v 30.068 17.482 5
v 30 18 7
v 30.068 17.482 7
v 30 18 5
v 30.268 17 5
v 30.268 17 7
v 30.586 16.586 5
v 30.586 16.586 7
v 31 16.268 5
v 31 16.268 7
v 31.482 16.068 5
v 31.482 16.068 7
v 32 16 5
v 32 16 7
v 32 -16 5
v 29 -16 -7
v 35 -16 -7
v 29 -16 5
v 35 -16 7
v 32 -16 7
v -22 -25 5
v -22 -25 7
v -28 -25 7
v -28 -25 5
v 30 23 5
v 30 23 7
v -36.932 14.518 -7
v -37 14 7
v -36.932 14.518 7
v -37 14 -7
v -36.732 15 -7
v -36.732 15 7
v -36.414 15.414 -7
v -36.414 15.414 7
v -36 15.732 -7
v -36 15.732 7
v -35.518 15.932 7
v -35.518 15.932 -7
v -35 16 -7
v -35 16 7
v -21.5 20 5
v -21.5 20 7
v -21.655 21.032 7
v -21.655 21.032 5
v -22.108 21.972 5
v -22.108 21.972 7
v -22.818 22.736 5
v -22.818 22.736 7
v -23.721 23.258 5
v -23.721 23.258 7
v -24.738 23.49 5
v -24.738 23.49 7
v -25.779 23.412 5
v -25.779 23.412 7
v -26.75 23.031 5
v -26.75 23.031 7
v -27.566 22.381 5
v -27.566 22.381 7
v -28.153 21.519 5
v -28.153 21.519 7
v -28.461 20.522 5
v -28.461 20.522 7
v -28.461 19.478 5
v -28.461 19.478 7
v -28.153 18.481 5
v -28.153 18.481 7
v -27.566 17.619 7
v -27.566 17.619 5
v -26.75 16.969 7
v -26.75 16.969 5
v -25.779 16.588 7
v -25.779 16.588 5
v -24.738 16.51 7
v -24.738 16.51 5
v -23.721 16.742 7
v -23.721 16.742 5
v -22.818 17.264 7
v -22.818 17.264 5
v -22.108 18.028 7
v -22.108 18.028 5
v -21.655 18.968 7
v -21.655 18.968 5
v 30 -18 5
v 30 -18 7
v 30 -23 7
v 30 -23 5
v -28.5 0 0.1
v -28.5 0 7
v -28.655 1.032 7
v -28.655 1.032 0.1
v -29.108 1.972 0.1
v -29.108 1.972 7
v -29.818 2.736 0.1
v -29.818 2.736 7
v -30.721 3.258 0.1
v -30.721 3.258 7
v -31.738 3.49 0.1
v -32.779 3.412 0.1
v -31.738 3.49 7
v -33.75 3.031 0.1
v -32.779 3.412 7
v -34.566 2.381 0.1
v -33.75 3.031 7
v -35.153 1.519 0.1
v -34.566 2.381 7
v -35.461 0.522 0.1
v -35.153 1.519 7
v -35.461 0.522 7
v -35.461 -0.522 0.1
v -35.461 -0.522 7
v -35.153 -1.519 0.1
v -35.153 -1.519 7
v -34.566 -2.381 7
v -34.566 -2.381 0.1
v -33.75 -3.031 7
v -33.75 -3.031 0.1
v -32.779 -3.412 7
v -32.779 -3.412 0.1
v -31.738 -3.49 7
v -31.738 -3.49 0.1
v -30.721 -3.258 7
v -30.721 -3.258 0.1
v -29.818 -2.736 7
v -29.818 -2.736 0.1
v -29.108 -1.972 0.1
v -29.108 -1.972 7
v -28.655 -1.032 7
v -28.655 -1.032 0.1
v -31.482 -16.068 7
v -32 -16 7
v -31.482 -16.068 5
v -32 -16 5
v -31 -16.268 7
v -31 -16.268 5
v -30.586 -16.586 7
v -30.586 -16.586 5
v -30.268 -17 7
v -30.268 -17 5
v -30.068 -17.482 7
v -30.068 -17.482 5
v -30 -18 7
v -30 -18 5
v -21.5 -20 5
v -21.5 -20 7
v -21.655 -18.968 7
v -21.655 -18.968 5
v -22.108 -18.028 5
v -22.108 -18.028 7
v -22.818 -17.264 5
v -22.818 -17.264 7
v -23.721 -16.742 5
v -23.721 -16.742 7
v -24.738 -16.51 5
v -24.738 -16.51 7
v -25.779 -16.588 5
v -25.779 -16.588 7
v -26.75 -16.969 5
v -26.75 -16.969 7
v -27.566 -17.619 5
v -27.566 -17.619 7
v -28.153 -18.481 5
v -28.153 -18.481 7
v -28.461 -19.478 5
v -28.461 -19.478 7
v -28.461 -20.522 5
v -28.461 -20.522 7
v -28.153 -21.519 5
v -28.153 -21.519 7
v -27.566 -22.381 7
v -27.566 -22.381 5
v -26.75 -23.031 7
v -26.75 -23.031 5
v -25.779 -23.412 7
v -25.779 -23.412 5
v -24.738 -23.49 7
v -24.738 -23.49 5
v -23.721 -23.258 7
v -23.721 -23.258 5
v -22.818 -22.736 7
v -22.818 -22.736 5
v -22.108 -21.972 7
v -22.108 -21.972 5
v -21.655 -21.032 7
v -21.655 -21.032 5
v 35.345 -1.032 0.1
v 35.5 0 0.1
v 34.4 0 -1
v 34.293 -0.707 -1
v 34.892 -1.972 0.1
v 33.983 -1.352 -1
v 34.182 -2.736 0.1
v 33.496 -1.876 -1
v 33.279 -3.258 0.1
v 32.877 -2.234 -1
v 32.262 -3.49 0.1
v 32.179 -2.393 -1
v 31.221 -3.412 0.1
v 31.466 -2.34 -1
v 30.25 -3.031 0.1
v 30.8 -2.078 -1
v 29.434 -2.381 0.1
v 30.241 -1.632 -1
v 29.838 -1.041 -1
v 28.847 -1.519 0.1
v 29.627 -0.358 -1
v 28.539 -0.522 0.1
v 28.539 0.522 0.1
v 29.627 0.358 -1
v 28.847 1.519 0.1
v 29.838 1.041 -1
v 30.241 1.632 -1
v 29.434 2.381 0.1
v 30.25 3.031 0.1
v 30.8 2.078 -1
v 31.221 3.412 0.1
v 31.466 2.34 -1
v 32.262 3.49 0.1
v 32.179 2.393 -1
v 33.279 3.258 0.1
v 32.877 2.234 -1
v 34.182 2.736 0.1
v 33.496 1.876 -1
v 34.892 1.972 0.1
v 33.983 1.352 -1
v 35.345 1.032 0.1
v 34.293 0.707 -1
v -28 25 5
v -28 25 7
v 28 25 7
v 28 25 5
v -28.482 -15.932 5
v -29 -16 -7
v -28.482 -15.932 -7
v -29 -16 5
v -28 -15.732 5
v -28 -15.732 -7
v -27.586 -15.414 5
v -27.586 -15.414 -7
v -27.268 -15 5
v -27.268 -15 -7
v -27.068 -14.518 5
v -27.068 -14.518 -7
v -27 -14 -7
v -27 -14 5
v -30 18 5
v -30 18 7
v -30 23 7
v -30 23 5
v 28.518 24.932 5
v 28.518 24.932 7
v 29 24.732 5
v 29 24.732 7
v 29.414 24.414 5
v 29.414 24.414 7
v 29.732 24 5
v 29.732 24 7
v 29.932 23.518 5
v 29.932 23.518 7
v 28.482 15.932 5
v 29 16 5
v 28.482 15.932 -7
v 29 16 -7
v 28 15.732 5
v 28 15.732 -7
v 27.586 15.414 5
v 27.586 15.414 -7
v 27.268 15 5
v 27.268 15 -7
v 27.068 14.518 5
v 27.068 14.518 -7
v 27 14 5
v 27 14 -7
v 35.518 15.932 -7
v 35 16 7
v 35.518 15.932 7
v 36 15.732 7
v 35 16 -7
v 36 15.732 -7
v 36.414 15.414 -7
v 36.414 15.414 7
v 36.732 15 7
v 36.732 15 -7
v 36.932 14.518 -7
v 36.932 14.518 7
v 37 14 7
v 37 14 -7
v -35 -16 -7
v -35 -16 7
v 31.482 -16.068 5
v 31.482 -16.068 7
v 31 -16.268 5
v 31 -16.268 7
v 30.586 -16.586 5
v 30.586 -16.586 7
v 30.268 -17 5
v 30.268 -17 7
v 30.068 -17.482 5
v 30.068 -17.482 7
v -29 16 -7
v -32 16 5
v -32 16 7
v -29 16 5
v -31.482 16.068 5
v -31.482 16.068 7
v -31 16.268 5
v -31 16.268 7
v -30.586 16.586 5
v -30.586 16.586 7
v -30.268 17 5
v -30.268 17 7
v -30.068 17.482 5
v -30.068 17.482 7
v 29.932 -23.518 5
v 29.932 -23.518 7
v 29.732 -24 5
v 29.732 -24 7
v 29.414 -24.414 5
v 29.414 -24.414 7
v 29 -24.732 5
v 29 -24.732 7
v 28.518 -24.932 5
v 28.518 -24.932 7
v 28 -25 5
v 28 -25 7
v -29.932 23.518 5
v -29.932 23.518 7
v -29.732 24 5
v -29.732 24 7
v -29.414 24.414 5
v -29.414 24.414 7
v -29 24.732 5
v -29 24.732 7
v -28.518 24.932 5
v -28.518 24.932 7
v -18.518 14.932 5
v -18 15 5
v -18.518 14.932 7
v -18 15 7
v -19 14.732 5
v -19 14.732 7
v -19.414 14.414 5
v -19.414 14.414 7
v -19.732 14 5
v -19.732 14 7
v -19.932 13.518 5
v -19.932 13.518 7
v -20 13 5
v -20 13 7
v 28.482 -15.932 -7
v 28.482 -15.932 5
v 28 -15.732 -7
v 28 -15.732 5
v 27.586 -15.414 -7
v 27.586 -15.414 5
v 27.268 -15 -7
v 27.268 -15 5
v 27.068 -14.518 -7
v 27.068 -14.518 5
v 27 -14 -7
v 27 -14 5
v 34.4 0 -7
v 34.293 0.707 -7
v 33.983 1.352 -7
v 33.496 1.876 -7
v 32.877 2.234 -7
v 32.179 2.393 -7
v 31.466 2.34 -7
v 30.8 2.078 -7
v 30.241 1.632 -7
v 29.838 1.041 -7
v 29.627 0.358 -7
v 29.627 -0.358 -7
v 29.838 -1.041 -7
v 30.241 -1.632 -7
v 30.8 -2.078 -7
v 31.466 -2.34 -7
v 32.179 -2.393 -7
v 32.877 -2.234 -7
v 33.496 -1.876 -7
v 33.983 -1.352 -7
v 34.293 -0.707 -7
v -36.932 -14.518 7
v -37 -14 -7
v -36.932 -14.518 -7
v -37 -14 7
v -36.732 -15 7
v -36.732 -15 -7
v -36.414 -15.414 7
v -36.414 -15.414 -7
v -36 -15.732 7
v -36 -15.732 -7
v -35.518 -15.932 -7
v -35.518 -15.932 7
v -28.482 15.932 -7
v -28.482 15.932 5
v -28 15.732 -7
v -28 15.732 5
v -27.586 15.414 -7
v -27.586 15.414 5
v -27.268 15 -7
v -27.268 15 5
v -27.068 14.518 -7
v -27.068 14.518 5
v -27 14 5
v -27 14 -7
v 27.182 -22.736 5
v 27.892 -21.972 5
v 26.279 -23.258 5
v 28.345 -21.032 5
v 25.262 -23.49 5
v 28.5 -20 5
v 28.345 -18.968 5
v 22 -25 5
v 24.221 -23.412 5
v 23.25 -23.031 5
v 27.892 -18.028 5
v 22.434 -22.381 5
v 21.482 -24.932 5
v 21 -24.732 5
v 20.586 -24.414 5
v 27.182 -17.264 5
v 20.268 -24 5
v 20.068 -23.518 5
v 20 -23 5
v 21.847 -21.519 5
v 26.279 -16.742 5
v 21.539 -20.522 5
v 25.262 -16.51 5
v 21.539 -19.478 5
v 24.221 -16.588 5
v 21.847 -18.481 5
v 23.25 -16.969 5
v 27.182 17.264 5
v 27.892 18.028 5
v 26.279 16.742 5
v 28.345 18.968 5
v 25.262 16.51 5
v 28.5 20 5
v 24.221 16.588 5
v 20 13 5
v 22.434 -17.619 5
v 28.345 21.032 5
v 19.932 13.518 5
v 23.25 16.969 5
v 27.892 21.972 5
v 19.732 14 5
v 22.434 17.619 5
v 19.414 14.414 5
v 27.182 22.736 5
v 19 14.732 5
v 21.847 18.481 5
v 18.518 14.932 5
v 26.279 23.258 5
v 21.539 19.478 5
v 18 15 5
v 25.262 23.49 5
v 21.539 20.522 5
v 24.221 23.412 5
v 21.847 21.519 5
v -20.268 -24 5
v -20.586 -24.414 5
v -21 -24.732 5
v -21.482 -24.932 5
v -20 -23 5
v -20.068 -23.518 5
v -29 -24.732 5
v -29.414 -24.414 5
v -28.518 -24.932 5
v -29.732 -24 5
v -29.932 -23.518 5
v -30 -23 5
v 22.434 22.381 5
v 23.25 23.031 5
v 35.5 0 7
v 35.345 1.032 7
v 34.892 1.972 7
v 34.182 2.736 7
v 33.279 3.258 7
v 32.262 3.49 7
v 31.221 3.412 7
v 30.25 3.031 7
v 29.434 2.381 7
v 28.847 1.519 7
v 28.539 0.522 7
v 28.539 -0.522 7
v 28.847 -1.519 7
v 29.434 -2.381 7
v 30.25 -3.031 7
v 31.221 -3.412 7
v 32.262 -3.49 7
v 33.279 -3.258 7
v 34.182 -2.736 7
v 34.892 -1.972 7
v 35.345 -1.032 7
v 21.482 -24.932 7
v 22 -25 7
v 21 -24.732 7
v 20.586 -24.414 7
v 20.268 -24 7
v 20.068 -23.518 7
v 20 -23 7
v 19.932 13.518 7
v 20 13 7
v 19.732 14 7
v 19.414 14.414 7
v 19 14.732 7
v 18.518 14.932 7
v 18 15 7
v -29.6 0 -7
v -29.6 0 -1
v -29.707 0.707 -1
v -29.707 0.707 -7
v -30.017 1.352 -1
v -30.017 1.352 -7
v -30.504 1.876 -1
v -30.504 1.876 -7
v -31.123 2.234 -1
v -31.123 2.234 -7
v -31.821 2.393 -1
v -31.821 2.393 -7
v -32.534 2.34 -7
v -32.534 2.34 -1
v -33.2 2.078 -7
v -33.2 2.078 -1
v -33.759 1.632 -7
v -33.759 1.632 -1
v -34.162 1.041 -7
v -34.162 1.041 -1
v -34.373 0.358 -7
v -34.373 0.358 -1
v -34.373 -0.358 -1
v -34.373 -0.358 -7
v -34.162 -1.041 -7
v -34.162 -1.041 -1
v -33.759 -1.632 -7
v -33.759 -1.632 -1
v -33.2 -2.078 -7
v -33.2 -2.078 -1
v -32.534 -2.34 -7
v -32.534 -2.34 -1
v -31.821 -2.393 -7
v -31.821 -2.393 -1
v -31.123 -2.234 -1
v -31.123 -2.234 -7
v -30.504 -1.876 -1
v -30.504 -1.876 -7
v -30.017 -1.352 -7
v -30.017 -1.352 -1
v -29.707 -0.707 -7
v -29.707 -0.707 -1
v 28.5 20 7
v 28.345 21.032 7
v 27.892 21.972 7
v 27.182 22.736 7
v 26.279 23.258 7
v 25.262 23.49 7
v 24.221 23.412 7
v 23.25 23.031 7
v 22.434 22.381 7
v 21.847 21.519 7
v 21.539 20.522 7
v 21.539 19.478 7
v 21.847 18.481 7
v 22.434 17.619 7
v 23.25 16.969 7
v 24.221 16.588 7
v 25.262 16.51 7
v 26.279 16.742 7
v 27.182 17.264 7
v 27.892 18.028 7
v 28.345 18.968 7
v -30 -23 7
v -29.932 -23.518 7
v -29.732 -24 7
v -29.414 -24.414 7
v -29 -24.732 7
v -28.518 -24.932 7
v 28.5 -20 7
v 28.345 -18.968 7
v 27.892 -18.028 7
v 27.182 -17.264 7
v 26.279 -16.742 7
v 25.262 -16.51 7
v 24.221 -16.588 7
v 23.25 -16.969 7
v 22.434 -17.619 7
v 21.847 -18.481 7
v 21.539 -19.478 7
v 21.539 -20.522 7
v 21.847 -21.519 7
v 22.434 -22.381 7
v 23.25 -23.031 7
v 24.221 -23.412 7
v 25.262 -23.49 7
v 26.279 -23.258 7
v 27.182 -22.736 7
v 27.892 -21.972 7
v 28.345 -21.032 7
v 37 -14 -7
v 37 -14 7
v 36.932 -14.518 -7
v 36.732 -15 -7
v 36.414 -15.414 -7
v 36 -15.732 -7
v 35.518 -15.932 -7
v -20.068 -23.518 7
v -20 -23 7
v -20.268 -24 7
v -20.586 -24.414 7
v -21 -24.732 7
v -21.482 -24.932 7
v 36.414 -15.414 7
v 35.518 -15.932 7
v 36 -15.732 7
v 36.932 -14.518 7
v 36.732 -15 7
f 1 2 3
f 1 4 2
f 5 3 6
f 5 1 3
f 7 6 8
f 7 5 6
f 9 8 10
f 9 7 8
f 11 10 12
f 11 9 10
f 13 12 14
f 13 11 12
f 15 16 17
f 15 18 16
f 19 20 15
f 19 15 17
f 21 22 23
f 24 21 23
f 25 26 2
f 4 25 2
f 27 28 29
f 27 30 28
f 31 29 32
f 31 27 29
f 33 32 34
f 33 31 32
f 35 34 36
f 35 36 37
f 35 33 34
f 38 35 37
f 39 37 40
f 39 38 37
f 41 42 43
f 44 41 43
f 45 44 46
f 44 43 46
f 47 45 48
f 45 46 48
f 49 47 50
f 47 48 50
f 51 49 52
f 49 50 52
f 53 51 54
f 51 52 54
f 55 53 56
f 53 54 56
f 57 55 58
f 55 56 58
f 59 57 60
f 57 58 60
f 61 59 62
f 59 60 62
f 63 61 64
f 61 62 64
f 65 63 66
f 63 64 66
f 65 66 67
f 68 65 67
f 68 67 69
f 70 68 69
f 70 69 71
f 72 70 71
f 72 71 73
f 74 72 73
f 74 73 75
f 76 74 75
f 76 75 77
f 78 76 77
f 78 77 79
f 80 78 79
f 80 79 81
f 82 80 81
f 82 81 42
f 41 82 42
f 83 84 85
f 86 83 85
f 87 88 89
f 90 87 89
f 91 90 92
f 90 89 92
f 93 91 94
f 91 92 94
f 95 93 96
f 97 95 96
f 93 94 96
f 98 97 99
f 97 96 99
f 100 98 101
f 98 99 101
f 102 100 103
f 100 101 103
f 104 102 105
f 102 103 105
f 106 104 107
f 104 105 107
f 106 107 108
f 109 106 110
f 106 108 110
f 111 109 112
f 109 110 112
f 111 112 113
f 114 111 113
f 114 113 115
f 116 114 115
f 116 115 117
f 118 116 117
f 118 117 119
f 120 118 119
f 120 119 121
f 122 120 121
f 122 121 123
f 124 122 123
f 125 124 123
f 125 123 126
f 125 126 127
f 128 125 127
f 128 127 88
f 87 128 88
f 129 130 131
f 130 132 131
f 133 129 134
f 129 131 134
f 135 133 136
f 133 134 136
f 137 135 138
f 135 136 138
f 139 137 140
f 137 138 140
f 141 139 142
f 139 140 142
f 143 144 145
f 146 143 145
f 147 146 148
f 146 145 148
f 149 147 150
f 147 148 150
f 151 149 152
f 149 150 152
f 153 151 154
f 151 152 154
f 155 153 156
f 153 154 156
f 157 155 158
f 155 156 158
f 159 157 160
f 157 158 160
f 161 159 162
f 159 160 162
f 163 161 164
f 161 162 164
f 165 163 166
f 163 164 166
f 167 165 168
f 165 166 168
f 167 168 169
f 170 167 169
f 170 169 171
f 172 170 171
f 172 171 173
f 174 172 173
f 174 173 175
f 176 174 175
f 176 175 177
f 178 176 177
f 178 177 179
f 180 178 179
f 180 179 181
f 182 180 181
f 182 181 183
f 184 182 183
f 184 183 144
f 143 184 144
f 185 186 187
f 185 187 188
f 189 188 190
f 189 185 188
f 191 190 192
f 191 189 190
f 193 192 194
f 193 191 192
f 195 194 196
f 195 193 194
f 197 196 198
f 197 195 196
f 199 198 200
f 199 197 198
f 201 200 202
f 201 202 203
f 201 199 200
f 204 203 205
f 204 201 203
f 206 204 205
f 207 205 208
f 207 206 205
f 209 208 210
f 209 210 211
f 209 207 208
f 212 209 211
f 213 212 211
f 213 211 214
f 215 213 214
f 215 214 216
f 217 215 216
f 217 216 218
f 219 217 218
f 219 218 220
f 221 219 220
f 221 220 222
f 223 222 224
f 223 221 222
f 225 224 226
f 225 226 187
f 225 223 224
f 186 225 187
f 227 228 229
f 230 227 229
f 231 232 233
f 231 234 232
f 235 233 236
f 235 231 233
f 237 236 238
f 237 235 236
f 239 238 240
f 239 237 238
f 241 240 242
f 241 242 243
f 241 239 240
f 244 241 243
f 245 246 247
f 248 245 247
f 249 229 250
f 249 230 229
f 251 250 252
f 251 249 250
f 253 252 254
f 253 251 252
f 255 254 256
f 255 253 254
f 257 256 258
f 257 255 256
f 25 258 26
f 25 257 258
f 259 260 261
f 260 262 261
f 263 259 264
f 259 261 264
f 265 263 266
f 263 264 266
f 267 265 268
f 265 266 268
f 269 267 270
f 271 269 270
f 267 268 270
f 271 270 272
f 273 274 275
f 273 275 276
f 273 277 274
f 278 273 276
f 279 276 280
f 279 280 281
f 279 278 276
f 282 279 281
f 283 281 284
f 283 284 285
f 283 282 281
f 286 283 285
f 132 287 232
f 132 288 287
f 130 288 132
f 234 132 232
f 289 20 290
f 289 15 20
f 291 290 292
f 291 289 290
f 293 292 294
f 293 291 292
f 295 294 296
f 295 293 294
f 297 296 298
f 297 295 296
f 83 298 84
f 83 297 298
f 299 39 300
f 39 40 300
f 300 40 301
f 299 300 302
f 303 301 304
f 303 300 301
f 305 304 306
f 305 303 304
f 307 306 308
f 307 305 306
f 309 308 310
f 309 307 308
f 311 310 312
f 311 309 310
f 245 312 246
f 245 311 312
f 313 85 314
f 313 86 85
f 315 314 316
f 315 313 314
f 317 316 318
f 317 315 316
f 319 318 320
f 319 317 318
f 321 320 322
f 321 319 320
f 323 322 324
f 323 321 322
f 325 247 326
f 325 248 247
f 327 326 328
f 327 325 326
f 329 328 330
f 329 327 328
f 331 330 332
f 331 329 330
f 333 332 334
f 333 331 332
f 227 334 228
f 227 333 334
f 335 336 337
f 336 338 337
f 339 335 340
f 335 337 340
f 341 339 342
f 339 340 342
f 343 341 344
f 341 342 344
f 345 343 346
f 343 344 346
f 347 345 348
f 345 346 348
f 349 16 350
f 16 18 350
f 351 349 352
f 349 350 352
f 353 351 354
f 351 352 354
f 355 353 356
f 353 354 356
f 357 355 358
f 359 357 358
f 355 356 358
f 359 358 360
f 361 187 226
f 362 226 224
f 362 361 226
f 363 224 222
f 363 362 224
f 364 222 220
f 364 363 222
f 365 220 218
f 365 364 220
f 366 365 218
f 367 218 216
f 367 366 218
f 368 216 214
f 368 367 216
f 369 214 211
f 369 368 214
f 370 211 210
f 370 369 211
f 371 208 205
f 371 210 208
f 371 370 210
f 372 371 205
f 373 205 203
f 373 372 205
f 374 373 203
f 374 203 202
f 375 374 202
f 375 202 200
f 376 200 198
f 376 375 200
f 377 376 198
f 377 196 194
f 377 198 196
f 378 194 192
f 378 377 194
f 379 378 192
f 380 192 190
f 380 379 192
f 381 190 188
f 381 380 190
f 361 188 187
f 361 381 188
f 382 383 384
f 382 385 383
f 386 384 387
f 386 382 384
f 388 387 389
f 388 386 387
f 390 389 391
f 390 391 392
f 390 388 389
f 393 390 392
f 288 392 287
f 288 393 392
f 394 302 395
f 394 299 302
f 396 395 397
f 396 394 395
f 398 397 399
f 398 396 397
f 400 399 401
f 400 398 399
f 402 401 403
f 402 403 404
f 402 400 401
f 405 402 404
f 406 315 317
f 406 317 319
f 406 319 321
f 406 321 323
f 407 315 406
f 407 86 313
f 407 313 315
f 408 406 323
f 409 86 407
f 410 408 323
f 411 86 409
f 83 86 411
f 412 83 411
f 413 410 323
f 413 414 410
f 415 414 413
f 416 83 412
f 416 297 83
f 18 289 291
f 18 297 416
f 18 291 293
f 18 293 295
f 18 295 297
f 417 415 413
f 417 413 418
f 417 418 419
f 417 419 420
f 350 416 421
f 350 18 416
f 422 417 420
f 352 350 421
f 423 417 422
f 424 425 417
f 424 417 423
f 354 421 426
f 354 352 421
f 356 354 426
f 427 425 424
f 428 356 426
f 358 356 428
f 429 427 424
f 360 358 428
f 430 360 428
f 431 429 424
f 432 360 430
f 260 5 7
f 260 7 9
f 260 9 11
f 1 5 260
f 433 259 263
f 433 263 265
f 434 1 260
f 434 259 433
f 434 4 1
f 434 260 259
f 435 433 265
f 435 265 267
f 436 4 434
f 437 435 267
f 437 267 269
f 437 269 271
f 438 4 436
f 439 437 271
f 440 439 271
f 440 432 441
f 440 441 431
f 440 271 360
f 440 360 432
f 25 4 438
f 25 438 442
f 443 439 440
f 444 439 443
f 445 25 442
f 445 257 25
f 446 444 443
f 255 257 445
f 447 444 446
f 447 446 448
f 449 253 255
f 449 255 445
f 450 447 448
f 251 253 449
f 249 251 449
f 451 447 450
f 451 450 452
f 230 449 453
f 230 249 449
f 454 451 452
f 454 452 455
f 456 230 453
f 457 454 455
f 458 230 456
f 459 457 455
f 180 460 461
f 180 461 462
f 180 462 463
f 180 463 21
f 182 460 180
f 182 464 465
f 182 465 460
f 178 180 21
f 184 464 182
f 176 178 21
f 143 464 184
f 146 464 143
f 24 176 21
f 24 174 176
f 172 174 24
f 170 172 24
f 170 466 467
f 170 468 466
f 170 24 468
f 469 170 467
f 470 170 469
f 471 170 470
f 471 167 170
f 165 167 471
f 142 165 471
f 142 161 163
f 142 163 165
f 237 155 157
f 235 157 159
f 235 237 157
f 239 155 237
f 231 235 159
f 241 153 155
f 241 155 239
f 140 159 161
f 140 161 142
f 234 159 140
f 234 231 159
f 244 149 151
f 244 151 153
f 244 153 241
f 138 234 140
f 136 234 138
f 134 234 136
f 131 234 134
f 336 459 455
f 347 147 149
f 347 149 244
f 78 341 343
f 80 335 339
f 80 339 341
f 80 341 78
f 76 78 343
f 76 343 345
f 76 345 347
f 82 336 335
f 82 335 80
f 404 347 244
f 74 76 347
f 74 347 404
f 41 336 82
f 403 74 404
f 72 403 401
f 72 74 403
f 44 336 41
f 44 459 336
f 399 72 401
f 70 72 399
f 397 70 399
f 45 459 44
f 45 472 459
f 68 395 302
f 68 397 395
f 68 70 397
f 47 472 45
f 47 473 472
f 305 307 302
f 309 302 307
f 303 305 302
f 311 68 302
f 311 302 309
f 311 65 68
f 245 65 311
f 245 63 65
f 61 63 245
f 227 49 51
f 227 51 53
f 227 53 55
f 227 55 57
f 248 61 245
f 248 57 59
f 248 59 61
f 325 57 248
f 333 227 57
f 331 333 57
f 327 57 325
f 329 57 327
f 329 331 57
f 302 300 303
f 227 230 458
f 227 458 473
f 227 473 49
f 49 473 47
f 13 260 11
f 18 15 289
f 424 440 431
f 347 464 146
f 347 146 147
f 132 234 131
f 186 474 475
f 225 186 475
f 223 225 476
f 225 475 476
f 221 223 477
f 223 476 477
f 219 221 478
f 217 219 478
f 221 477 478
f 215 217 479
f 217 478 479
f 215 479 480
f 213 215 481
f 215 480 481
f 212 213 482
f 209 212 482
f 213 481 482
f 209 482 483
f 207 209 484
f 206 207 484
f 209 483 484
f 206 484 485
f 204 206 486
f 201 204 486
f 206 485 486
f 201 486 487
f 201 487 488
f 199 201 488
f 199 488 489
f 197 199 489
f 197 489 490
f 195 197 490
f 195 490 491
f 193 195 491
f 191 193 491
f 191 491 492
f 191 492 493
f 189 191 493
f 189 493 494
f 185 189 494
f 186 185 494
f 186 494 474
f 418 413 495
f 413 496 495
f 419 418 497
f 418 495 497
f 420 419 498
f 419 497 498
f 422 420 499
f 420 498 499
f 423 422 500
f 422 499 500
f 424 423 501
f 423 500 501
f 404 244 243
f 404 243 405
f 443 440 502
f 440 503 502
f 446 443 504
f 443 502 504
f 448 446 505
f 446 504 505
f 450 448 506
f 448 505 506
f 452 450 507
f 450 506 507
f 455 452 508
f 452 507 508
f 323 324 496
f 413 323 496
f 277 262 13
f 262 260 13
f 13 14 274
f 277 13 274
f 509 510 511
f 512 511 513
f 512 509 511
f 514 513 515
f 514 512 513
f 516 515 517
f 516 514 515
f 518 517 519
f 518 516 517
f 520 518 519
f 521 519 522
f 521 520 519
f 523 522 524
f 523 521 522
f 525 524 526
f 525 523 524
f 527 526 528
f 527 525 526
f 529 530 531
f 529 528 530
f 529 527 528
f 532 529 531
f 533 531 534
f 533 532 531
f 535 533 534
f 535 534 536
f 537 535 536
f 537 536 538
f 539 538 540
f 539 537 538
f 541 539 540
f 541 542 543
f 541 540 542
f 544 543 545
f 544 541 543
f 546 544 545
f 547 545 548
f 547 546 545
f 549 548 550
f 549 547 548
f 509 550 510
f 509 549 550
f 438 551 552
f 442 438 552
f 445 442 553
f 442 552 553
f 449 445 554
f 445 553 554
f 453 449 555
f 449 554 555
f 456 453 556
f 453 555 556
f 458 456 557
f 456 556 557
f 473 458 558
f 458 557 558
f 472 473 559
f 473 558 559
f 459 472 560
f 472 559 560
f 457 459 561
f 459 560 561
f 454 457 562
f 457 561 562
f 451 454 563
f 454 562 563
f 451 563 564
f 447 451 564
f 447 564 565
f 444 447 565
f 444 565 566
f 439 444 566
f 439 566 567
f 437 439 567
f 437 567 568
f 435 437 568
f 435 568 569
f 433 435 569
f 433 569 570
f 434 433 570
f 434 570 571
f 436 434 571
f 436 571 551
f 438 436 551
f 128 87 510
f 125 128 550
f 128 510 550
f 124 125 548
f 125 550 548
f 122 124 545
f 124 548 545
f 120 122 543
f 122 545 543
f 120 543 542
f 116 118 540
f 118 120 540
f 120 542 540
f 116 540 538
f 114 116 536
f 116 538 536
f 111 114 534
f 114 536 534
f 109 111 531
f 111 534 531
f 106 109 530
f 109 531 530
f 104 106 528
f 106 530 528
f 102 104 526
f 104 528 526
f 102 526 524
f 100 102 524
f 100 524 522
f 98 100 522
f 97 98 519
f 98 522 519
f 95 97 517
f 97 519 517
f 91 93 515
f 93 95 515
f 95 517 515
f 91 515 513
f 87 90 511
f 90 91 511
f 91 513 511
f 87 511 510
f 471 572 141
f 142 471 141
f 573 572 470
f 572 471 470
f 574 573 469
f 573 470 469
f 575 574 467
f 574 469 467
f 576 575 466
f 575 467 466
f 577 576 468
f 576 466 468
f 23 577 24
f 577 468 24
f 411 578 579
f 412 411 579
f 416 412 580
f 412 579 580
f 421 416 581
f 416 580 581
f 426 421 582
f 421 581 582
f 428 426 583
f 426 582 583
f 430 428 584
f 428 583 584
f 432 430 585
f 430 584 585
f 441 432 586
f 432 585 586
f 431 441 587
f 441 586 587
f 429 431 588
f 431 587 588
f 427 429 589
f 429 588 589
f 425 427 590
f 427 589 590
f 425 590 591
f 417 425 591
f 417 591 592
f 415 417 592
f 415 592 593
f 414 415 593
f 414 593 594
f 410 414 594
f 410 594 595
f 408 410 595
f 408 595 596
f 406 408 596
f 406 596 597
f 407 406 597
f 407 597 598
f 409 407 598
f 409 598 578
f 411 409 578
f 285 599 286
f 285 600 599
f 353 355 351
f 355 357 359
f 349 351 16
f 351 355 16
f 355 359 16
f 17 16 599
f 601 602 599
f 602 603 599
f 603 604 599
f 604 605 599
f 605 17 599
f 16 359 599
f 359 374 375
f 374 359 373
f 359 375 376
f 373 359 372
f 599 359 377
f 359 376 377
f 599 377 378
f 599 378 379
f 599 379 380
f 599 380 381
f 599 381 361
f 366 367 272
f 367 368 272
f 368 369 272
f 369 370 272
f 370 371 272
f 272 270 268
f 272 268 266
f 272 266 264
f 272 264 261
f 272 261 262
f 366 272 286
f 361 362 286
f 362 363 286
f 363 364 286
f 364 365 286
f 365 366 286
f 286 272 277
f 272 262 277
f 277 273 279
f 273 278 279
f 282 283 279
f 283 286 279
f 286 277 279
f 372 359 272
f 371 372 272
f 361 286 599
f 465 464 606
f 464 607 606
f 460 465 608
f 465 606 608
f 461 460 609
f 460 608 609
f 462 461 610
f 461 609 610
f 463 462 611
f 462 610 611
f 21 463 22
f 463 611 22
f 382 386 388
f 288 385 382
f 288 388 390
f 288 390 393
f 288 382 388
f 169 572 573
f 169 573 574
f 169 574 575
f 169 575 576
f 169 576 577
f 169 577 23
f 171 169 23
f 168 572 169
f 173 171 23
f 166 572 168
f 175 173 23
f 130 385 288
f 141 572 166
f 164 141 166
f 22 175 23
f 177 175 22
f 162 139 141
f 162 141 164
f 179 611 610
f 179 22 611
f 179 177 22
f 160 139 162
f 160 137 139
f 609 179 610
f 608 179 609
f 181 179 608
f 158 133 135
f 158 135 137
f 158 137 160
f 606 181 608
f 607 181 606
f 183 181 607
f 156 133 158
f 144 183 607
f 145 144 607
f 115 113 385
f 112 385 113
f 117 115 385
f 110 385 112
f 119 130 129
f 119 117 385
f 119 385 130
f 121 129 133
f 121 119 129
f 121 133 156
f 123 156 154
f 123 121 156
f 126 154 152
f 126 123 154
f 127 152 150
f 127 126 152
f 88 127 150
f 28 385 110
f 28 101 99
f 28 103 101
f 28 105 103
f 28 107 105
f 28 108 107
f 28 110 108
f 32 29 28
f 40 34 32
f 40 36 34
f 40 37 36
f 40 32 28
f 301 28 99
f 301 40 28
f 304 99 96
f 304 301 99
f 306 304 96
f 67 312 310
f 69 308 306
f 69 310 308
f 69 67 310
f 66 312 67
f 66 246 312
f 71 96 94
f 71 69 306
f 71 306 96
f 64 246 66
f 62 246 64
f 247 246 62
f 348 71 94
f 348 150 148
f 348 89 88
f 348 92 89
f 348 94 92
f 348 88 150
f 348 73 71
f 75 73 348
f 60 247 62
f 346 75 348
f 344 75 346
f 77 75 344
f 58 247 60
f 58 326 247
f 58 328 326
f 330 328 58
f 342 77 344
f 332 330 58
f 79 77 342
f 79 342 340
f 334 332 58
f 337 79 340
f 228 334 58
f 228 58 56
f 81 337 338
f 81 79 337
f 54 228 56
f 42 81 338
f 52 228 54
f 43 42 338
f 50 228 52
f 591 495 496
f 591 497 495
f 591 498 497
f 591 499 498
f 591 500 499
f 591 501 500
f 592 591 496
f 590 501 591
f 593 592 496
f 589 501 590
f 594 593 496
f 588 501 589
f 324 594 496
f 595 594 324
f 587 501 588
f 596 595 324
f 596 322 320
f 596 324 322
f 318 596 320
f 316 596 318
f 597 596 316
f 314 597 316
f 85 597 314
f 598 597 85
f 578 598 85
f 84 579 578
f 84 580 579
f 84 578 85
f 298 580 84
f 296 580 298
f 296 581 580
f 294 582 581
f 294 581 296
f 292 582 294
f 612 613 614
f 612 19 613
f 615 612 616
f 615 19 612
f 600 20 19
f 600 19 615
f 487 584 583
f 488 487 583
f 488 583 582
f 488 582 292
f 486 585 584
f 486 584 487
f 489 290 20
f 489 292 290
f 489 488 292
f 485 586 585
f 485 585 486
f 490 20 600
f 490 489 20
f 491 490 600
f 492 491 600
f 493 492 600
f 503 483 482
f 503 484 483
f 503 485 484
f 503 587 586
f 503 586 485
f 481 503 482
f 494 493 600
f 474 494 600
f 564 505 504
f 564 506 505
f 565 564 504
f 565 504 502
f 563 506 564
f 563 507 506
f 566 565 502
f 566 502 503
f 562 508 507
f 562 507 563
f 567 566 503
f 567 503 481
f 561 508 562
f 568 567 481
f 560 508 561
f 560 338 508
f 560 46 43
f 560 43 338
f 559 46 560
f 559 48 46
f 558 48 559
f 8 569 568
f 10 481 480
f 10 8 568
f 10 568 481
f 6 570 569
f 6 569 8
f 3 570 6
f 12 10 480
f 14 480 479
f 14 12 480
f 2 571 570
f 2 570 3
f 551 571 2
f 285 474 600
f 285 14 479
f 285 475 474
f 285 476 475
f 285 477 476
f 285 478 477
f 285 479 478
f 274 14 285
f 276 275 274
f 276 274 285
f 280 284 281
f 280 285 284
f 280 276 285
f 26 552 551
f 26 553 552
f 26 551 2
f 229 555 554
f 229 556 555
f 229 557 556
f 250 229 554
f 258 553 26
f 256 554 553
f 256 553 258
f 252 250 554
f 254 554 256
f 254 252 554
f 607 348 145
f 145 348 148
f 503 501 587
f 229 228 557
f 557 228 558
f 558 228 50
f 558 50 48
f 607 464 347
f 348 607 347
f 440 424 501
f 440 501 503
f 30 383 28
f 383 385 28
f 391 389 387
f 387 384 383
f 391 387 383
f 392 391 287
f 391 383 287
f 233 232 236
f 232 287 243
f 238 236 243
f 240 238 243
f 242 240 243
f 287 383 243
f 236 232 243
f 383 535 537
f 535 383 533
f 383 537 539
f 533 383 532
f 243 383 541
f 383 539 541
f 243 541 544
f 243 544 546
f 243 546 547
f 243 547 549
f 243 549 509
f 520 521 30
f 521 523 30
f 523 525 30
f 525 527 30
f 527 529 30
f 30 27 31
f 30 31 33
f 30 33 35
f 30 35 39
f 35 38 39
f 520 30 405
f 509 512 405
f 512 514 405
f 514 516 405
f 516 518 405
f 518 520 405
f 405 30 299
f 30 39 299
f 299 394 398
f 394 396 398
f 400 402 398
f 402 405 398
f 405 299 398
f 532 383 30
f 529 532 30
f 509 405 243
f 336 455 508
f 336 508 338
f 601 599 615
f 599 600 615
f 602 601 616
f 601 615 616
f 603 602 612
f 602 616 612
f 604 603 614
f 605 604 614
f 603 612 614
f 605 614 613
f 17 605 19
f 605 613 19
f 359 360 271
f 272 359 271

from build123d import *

# Parameters (mm, degrees)
SKETCH1_W             = 10
SKETCH1_H             = 32
SKETCH1_R             = 2.4
BOSS_EXTRUDE1_DEPTH   = 7
BOSS_EXTRUDE1_2_DEPTH = 7
SKETCH3_R             = 1.6
BOSS_EXTRUDE2_DEPTH   = 2
SKETCH2_R             = 3.5
CUT_EXTRUDE2_DEPTH    = 6
SKETCH4_W             = 40
SKETCH4_H             = 40
CUT_EXTRUDE3_DEPTH    = 47.238512087
FILLET1_R             = 2
CHAMFER1_SIZE         = 2


with BuildPart() as part:
    # Sketch1 → Boss-Extrude1 (new, symmetric)
    with BuildSketch(Plane.XY):
        with Locations((-32, 0)):
            Rectangle(SKETCH1_W, SKETCH1_H)
        with Locations((-32, 0)):
            Circle(SKETCH1_R, mode=Mode.SUBTRACT)
    extrude(amount=BOSS_EXTRUDE1_DEPTH, both=True)



with BuildPart() as body_2:
    # Sketch1 → Boss-Extrude1 2 (new, symmetric)
    with BuildSketch(Plane.XY):
        with Locations((32, 0)):
            Rectangle(SKETCH1_W, SKETCH1_H)
        with Locations((32, 0)):
            Circle(SKETCH1_R, mode=Mode.SUBTRACT)
    extrude(amount=BOSS_EXTRUDE1_2_DEPTH, both=True)


with BuildPart() as part_1:
    add(part.part)

    add(body_2.part)  # Boss-Extrude2 merges body 2
    # Sketch3 → Boss-Extrude2 (add)
    with BuildSketch(Plane.XY.offset(7)):
        Polygon((-37, 16), (-30, 16), (-30, 25), (30, 25), (30, 16), (37, 16), (37, -16), (30, -16), (30, -25), (-30, -25), (-30, -16), (-37, -16), align=None)
        with Locations((-25, 20)):
            Circle(SKETCH3_R, mode=Mode.SUBTRACT)
        with Locations((25, 20)):
            Circle(SKETCH3_R, mode=Mode.SUBTRACT)
        with Locations((25, -20)):
            Circle(SKETCH3_R, mode=Mode.SUBTRACT)
        with Locations((-25, -20)):
            Circle(SKETCH3_R, mode=Mode.SUBTRACT)
    extrude(amount=-BOSS_EXTRUDE2_DEPTH)

    # Sketch2 → Cut-Extrude2 (cut)
    with BuildSketch(Plane.XY.offset(7)):
        with Locations((-32, 0)):
            Circle(SKETCH2_R)
        with Locations((32, 0)):
            Circle(SKETCH2_R)
        with Locations((-25, 20)):
            Circle(SKETCH2_R)
        with Locations((25, 20)):
            Circle(SKETCH2_R)
        with Locations((25, -20)):
            Circle(SKETCH2_R)
        with Locations((-25, -20)):
            Circle(SKETCH2_R)
    extrude(amount=-CUT_EXTRUDE2_DEPTH, mode=Mode.SUBTRACT)

    # Sketch4 → Cut-Extrude3 (cut, through all)
    with BuildSketch(Plane(origin=(0, 0, 5), x_dir=(-1, 0, 0), z_dir=(0, 0, -1))):
        with Locations((0, -5)):
            Rectangle(SKETCH4_W, SKETCH4_H)
    extrude(amount=-CUT_EXTRUDE3_DEPTH, mode=Mode.SUBTRACT)

    # Fillet1
    fillet1_edges = [part_1.edges().sort_by_distance(p)[0] for p in [
        (20, -25, 6),
        (20, 15, 6),
        (-20, 15, 6),
        (-20, -25, 6),
        (-27, 16, -1),
        (-27, -16, -1),
        (-30, 16, 6),
        (-30, 25, 6),
        (30, 25, 6),
        (30, 16, 6),
        (37, 16, 0),
        (37, -16, 0),
        (30, -16, 6),
        (30, -25, 6),
        (-30, -25, 6),
        (-30, -16, 6),
        (27, 16, -1),
        (27, -16, -1),
        (-37, 16, 0),
        (-37, -16, 0),
    ]]
    fillet(fillet1_edges, radius=FILLET1_R)

    # Chamfer1
    # the kernel refuses this chamfer: 2 mm, written as the material it takes off along each edge
    with BuildSketch(Plane(origin=(-32, 0, 1), x_dir=(1, 0, 0), z_dir=(0, 1, 0))) as chamfer1_piece_1_section:
        Polygon((2.4 + CHAMFER1_SIZE, 0), (2.4, CHAMFER1_SIZE), (2.4, 0), align=None)
    chamfer1_piece_1 = revolve(axis=Axis((-32, 0, 1), (0, 0, -1)), mode=Mode.PRIVATE)
    chamfer1_piece_1 = chamfer1_piece_1 & Plane(origin=(-32, 0, -0.456047854), x_dir=(1, 0, 0), z_dir=(0, 0, 1)) * Cylinder(3.5, 18, mode=Mode.PRIVATE)
    add(chamfer1_piece_1, mode=Mode.SUBTRACT)
    with BuildSketch(Plane(origin=(32, 0, 1), x_dir=(1, 0, 0), z_dir=(0, 1, 0))) as chamfer1_piece_2_section:
        Polygon((2.4, CHAMFER1_SIZE), (2.4 + CHAMFER1_SIZE, 0), (2.4, 0), align=None)
    chamfer1_piece_2 = revolve(axis=Axis((32, 0, 1), (0, 0, -1)), mode=Mode.PRIVATE)
    chamfer1_piece_2 = chamfer1_piece_2 & Plane(origin=(32, 0, -0.456047854), x_dir=(1, 0, 0), z_dir=(0, 0, 1)) * Cylinder(3.5, 18, mode=Mode.PRIVATE)
    add(chamfer1_piece_2, mode=Mode.SUBTRACT)


solid = part_1.part
